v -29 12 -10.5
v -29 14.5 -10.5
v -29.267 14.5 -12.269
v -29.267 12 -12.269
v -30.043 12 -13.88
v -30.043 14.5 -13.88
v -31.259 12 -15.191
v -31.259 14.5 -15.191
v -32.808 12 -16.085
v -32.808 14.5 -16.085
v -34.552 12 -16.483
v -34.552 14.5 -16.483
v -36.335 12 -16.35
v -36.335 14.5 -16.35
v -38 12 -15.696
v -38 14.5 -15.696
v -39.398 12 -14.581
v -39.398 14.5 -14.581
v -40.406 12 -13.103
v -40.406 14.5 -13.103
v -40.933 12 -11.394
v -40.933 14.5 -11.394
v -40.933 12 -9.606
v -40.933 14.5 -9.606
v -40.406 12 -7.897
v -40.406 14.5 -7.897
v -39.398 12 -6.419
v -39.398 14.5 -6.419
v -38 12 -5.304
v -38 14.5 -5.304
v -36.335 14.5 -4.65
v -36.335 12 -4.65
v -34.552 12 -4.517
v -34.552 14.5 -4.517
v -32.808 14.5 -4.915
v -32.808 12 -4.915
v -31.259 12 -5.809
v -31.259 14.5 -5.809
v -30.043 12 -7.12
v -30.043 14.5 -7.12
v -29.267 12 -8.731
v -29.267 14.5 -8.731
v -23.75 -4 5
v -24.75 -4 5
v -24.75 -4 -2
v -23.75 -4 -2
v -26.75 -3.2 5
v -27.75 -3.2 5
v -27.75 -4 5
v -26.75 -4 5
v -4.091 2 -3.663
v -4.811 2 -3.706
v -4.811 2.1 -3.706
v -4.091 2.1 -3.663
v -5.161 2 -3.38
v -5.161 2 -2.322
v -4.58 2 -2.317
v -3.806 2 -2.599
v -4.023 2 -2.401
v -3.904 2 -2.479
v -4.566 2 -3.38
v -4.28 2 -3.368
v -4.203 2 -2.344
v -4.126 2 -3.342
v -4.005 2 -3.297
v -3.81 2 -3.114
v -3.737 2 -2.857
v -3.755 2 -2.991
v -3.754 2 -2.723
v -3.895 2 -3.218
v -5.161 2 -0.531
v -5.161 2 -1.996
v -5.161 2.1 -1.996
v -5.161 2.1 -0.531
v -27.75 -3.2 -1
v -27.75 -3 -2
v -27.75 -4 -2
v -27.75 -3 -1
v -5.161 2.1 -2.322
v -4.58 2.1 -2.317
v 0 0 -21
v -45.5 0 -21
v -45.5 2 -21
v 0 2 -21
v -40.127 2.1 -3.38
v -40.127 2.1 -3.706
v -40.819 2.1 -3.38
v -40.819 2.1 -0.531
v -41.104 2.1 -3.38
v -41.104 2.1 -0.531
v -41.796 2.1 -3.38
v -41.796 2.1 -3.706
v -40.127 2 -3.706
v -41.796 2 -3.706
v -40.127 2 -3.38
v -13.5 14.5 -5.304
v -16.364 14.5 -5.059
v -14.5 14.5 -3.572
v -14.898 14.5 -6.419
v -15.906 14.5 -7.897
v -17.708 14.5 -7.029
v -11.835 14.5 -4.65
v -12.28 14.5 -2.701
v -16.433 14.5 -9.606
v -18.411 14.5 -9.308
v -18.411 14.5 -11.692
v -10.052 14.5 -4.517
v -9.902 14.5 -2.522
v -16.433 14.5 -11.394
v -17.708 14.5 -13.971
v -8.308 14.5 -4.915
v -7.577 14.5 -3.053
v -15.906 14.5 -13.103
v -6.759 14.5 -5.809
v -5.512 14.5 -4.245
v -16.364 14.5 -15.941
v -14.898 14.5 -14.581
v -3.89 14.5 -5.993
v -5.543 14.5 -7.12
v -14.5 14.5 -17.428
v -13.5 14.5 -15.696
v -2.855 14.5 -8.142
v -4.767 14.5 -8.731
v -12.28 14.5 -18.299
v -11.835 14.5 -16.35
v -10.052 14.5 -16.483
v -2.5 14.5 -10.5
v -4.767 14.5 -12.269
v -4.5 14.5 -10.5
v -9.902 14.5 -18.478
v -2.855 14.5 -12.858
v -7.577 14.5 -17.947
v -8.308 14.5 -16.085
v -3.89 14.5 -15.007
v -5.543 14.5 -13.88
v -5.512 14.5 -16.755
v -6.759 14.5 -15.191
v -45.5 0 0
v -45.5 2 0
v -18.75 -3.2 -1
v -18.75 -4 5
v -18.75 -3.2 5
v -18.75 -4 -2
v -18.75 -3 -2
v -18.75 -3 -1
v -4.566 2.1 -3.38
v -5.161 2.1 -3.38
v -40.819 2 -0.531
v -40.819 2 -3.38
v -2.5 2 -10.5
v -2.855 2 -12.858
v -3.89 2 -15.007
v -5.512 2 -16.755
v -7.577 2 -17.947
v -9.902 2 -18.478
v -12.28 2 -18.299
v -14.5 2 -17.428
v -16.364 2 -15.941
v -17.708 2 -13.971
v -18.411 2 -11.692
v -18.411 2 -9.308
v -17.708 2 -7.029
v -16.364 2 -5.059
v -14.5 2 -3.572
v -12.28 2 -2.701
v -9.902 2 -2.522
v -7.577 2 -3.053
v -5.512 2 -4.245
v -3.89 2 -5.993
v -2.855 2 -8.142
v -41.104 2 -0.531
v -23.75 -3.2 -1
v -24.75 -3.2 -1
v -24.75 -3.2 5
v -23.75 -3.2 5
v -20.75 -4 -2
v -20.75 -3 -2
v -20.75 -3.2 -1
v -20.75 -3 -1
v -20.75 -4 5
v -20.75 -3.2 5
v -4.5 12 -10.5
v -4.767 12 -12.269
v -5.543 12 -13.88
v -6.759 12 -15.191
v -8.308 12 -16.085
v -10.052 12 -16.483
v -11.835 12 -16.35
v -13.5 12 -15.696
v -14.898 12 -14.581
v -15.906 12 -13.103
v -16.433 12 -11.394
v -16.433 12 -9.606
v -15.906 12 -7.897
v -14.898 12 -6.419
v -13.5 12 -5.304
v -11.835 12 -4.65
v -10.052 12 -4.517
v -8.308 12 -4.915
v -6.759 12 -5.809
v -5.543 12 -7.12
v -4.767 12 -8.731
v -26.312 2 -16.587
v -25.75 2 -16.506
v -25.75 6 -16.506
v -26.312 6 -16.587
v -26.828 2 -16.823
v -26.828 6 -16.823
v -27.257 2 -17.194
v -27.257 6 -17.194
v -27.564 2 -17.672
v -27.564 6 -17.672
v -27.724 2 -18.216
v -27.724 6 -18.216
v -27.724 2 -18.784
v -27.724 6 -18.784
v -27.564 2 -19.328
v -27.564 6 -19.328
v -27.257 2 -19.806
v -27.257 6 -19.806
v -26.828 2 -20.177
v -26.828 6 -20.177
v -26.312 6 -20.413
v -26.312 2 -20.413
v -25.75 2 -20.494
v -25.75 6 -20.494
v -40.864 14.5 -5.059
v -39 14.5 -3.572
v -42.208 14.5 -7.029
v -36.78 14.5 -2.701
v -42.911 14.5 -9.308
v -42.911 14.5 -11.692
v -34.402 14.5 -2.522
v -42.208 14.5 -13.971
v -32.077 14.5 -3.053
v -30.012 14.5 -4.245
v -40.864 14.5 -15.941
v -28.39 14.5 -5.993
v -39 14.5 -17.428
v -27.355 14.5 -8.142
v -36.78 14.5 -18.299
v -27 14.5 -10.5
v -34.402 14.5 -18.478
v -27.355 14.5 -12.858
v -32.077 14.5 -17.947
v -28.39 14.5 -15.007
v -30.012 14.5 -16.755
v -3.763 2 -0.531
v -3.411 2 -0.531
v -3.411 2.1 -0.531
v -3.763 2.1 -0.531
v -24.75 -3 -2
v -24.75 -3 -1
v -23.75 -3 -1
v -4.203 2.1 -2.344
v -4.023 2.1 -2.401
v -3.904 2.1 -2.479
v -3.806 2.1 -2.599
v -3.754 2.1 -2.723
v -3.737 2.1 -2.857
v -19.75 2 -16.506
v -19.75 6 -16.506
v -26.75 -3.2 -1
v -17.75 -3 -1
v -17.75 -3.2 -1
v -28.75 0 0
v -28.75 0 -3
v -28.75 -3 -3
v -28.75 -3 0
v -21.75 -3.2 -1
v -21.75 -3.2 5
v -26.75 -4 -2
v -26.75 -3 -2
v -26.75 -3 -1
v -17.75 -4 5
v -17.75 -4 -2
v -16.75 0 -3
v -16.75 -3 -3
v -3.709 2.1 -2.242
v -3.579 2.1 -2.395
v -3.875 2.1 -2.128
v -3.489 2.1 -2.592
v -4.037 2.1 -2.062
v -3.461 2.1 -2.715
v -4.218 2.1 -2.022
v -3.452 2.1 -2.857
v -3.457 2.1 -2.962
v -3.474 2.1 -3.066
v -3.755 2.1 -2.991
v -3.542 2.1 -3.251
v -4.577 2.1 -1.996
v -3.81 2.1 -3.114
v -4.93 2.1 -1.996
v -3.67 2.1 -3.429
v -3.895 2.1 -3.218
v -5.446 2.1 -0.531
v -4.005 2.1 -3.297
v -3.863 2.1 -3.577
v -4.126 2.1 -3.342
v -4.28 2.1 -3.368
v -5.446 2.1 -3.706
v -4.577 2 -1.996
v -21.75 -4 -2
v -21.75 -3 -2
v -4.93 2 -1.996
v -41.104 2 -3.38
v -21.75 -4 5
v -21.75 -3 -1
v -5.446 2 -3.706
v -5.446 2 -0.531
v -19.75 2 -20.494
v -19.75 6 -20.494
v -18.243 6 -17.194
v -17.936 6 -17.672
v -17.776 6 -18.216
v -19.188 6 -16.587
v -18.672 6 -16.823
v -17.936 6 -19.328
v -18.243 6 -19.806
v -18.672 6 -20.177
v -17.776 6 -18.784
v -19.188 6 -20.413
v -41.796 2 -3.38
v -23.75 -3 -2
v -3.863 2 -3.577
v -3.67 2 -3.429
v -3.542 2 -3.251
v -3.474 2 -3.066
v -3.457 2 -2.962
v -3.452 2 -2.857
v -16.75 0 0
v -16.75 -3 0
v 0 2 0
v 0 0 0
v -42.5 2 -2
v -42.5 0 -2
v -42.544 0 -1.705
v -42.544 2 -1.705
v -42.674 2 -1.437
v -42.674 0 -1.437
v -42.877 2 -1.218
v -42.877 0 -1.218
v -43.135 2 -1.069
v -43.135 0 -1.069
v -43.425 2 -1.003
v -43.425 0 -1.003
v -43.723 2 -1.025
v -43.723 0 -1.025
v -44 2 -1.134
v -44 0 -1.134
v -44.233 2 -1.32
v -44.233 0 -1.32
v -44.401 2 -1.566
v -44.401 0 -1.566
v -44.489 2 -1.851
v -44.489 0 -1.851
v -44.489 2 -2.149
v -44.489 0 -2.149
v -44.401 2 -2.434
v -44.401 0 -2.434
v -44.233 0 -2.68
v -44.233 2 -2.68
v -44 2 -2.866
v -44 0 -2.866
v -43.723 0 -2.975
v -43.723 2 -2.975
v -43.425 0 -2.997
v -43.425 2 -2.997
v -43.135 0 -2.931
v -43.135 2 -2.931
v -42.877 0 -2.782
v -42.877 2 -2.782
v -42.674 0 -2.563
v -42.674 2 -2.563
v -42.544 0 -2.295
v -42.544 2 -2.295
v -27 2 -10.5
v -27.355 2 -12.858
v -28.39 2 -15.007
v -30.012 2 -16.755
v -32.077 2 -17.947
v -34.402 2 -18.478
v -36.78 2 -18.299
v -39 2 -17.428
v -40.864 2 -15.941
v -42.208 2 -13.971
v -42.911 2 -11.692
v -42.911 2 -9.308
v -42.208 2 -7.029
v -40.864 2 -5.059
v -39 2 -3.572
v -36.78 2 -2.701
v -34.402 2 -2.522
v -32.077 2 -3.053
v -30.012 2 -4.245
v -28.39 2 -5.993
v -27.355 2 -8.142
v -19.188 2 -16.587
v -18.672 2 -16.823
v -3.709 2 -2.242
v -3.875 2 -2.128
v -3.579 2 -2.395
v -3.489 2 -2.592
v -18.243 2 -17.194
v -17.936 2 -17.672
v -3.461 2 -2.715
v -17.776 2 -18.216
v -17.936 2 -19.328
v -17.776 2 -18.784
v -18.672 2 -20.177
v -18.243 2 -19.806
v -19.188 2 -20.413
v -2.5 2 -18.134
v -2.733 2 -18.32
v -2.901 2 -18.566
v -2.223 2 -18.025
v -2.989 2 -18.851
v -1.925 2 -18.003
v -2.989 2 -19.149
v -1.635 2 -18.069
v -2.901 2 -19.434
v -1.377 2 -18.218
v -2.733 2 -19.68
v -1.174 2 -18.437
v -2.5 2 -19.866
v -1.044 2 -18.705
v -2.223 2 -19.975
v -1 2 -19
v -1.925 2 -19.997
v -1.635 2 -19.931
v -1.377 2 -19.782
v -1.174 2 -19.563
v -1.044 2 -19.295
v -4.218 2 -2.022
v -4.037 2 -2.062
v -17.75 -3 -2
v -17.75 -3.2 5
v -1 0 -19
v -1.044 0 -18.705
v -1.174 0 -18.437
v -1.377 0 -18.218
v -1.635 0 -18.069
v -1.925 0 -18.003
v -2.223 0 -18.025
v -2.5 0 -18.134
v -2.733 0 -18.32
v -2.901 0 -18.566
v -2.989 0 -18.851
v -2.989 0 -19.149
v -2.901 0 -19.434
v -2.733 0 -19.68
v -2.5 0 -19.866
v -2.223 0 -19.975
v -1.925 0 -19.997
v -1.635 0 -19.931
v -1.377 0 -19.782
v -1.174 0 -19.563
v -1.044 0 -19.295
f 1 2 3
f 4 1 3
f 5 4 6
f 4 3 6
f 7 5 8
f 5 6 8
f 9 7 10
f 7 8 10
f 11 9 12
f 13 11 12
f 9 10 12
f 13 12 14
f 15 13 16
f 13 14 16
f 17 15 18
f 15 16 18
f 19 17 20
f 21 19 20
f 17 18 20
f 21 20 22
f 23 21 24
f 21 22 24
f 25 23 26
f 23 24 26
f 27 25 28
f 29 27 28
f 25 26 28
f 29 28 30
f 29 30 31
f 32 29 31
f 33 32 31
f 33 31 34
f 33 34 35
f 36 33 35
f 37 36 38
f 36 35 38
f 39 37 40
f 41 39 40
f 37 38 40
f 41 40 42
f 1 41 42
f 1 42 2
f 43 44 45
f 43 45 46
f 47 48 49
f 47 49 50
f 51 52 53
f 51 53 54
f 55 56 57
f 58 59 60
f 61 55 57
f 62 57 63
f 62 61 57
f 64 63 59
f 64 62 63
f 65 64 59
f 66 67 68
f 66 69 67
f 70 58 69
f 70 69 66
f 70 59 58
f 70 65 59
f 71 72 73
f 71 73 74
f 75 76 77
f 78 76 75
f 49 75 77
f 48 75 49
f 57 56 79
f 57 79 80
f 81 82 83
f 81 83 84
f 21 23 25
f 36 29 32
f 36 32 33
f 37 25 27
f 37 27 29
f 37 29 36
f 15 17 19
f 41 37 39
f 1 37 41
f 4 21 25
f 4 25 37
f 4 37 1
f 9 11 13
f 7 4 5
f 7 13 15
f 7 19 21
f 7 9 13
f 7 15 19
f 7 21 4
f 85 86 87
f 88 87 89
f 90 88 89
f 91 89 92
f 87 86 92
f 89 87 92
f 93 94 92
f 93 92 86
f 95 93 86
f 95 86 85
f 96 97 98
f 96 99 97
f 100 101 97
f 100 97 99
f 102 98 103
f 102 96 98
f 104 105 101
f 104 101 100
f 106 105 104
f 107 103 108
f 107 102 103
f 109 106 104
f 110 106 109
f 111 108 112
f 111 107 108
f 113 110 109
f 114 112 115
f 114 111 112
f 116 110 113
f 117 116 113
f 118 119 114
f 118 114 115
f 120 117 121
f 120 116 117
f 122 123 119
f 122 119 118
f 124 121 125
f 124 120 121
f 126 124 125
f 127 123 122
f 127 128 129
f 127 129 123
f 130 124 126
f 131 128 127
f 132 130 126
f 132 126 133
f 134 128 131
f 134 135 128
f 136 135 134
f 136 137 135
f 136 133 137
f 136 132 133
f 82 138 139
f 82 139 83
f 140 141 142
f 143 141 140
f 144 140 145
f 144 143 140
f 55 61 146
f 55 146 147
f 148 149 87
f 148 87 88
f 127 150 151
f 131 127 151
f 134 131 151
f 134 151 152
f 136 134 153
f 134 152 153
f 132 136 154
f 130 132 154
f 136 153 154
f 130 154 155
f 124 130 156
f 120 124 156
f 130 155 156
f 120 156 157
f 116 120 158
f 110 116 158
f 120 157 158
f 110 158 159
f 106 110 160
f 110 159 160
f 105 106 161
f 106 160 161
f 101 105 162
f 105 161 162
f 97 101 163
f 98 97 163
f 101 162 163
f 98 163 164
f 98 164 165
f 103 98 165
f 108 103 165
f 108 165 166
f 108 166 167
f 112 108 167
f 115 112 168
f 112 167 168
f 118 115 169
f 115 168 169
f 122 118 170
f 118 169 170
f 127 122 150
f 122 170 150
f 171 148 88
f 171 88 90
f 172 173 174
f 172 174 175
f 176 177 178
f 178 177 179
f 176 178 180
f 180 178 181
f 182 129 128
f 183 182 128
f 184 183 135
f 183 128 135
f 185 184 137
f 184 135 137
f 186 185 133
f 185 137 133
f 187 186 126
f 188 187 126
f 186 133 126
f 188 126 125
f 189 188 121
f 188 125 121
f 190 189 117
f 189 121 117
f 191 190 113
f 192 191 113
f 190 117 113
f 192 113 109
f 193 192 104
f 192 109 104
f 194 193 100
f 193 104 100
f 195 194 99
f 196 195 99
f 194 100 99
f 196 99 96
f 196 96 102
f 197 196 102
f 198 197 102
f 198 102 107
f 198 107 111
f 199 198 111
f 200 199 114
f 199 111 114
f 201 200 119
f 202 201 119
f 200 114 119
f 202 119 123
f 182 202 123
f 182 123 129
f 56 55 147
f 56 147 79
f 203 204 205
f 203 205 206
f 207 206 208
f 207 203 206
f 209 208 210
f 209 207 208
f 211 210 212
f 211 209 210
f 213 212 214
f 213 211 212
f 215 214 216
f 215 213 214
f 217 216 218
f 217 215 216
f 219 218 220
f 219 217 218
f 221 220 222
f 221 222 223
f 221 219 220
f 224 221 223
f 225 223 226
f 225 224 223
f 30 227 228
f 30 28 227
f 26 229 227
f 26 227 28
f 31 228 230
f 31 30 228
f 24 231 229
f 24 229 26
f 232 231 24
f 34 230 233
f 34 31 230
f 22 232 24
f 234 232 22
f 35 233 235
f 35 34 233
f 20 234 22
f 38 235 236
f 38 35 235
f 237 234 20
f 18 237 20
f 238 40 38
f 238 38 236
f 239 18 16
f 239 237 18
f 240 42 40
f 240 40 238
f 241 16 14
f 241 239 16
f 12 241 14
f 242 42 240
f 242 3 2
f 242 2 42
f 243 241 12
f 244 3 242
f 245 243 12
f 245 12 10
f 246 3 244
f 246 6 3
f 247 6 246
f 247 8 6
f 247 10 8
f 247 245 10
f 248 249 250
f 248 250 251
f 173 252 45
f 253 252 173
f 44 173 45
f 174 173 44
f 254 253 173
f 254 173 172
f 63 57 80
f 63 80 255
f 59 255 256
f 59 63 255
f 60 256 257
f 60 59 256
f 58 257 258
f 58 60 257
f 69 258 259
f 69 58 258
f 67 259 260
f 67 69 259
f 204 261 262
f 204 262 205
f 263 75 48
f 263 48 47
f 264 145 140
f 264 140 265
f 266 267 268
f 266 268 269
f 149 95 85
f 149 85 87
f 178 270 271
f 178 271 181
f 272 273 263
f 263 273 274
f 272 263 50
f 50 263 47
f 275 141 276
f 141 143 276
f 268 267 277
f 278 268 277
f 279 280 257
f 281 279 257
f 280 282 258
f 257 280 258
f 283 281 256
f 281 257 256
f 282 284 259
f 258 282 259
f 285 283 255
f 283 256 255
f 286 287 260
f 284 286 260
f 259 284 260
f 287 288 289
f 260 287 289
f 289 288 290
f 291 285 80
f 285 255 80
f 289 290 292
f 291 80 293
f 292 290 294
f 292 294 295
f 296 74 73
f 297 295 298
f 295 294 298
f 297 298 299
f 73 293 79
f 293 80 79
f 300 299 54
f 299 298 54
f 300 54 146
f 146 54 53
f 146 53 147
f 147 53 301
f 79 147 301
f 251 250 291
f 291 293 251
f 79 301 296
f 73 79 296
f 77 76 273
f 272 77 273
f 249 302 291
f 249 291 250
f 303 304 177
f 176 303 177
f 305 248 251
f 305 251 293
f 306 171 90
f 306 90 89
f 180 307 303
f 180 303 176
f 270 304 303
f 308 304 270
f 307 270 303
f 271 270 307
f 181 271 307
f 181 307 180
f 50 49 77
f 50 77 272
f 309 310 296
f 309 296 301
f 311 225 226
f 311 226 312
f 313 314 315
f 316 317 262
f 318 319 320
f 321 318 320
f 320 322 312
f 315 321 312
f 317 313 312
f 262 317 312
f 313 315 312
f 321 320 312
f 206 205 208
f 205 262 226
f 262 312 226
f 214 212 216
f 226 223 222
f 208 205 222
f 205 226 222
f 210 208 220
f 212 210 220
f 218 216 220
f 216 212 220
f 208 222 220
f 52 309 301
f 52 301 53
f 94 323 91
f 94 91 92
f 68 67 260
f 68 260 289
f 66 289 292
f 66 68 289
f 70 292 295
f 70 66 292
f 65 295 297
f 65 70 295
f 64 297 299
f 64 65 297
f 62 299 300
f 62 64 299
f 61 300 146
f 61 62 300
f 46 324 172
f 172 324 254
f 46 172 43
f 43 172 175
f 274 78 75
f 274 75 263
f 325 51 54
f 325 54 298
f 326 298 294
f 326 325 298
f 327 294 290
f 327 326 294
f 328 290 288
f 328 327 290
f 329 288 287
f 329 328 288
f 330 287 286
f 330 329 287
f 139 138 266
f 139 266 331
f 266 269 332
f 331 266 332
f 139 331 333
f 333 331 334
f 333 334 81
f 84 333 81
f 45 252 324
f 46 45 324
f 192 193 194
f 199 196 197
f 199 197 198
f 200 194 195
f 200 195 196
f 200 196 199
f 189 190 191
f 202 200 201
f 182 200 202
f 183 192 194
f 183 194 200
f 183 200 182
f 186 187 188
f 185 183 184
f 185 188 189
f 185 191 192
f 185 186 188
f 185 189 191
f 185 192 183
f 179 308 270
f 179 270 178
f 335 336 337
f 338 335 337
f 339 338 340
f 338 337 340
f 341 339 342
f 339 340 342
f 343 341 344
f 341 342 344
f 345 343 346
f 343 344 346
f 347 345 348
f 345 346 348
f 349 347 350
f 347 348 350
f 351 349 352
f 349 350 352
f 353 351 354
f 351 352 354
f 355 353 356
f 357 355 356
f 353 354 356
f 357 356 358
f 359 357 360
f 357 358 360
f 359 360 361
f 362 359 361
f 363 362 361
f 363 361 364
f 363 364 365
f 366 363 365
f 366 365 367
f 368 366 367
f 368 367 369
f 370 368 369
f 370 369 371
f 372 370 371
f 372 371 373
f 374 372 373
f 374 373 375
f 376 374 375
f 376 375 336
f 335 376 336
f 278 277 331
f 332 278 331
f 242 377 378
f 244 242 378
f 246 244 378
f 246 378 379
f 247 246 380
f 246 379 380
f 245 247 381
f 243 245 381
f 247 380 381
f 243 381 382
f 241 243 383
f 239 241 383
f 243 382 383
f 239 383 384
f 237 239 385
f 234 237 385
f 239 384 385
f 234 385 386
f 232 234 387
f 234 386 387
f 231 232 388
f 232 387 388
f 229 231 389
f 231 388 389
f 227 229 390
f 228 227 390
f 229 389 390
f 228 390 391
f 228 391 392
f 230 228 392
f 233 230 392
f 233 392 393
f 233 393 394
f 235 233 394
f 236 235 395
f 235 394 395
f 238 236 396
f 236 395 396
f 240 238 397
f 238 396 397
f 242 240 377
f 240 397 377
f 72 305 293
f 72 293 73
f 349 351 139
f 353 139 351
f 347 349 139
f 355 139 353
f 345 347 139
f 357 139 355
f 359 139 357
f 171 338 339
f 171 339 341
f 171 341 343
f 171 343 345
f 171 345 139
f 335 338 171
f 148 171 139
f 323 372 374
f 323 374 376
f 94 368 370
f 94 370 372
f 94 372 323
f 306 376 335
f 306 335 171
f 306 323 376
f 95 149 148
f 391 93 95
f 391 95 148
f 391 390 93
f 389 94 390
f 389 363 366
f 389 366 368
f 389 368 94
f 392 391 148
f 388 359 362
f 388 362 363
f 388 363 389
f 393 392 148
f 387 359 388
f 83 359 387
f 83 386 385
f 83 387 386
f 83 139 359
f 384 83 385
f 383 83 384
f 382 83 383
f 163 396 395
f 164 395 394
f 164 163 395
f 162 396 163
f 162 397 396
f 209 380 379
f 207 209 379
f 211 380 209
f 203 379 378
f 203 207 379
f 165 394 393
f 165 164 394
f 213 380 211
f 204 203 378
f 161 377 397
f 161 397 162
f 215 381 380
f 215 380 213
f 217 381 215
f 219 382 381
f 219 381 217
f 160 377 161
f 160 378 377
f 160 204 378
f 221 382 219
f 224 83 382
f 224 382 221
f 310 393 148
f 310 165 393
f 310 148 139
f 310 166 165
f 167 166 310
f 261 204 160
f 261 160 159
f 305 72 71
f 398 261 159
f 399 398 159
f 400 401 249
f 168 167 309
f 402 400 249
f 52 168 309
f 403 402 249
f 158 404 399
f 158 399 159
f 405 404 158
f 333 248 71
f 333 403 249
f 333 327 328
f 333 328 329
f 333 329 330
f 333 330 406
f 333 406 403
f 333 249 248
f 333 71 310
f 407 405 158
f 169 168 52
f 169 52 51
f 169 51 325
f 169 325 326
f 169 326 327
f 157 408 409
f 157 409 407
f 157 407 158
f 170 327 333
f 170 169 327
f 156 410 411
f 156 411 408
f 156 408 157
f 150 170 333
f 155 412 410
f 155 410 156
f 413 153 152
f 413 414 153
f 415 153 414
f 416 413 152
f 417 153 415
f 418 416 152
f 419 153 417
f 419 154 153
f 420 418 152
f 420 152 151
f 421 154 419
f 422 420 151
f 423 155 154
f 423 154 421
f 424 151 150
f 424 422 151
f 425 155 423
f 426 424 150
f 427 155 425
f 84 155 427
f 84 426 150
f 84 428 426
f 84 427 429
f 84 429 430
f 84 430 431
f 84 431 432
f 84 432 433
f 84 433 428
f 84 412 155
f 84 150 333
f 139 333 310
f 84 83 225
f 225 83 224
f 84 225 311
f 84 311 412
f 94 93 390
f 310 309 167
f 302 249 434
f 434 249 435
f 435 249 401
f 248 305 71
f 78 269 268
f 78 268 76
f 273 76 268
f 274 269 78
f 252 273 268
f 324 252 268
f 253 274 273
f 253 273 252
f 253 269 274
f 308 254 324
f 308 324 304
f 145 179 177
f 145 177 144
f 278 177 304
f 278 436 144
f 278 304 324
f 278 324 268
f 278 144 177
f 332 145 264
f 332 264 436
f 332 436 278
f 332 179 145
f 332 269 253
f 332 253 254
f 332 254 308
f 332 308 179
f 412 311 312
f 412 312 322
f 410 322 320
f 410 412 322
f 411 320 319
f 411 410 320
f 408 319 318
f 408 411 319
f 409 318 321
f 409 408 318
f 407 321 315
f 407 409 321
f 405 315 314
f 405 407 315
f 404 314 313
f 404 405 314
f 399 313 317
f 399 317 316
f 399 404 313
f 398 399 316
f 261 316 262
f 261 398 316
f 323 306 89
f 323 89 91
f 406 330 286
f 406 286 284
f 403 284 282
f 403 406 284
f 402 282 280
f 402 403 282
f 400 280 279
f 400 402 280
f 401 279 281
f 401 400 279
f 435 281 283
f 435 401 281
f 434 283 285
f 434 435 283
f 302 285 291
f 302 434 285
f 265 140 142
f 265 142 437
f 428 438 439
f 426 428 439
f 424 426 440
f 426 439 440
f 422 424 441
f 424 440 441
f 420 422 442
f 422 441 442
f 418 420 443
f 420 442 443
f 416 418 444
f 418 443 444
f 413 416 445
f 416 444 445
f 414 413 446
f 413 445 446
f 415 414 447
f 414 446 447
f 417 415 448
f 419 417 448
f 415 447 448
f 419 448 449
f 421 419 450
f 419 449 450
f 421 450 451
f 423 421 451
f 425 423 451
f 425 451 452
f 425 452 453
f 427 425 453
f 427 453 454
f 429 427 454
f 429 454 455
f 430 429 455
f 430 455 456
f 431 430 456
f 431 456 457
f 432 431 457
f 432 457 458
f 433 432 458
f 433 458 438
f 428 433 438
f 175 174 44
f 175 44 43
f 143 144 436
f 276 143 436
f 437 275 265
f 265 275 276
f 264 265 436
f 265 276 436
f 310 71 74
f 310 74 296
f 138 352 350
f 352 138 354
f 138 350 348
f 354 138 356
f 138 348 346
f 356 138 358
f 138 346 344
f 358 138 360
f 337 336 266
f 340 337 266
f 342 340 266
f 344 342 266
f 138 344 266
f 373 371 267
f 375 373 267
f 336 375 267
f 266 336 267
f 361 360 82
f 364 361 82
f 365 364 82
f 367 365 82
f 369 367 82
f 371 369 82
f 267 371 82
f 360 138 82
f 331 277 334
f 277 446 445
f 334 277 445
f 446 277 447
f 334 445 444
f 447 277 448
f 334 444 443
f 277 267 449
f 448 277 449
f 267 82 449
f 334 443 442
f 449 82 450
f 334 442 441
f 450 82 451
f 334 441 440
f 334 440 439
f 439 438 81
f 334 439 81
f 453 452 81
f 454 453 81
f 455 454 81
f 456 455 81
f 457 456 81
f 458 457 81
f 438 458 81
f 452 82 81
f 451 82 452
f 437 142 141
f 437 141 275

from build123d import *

# Parameters (mm, degrees)
SKETCH2_W            = 45.5
SKETCH2_H            = 21
BOSS_EXTRUDE2_DEPTH  = 2
SKETCH4_R            = 8
BOSS_EXTRUDE3_DEPTH  = 12.5
SKETCH5_R            = 6
CUT_EXTRUDE1_DEPTH   = 2.5
BOSS_EXTRUDE5_DEPTH  = 4
SKETCH7_W            = 6
SKETCH7_H            = 3
BOSS_EXTRUDE6_DEPTH  = 3
SKETCH8_W            = 1
SKETCH8_H            = 1
BOSS_EXTRUDE7_DEPTH  = 1
SKETCH10_W           = 1
SKETCH10_H           = 0.8
BOSS_EXTRUDE8_DEPTH  = 6
SKETCH11_R           = 1
CUT_EXTRUDE2_DEPTH   = 15.5
BOSS_EXTRUDE10_DEPTH = 0.1


with BuildPart() as part:
    # Sketch2 → Boss-Extrude2 (new body)
    with BuildSketch(Plane(origin=(0, 0, 0), x_dir=(1, 0, 0), z_dir=(0, 1, 0))):
        with Locations((-22.75, 10.5)):
            Rectangle(SKETCH2_W, SKETCH2_H)
    extrude(amount=BOSS_EXTRUDE2_DEPTH)

    # Sketch4 → Boss-Extrude3 (add)
    with BuildSketch(Plane(origin=(0, 2, 0), x_dir=(1, 0, 0), z_dir=(0, 1, 0))):
        with Locations((-35, 10.5)):
            Circle(SKETCH4_R)
        with Locations((-10.5, 10.5)):
            Circle(SKETCH4_R)
    extrude(amount=BOSS_EXTRUDE3_DEPTH)

    # Sketch5 → Cut-Extrude1 (cut)
    with BuildSketch(Plane(origin=(0, 14.5, 0), x_dir=(1, 0, 0), z_dir=(0, 1, 0))):
        with Locations((-35, 10.5)):
            Circle(SKETCH5_R)
        with Locations((-10.5, 10.5)):
            Circle(SKETCH5_R)
    extrude(amount=-CUT_EXTRUDE1_DEPTH, mode=Mode.SUBTRACT)

    # Sketch6 → Boss-Extrude5 (add)
    with BuildSketch(Plane(origin=(0, 2, 0), x_dir=(1, 0, 0), z_dir=(0, 1, 0))):
        with BuildLine():
            Line((-25.75, 20.493953902), (-19.75, 20.493953902))
            ThreePointArc((-19.75, 20.493953902), (-17.756046098, 18.5), (-19.75, 16.506046098))
            Line((-19.75, 16.506046098), (-25.75, 16.506046098))
            ThreePointArc((-25.75, 16.506046098), (-27.743953902, 18.5), (-25.75, 20.493953902))
        make_face()
    extrude(amount=BOSS_EXTRUDE5_DEPTH)

    # Sketch7 → Boss-Extrude6 (add)
    with BuildSketch(Plane.XZ):
        with Locations((-19.75, -1.5)):
            Rectangle(SKETCH7_W, SKETCH7_H)
        with Locations((-25.75, -1.5)):
            Rectangle(SKETCH7_W, SKETCH7_H)
    extrude(amount=BOSS_EXTRUDE6_DEPTH)

    # Sketch8 → Boss-Extrude7 (add)
    with BuildSketch(Plane.XZ.offset(3)):
        with Locations((-24.25, -1.5)):
            Rectangle(SKETCH8_W, SKETCH8_H)
        with Locations((-21.25, -1.5)):
            Rectangle(SKETCH8_W, SKETCH8_H)
        with Locations((-18.25, -1.5)):
            Rectangle(SKETCH8_W, SKETCH8_H)
        with Locations((-27.25, -1.5)):
            Rectangle(SKETCH8_W, SKETCH8_H)
    extrude(amount=BOSS_EXTRUDE7_DEPTH)

    # Sketch10 → Boss-Extrude8 (add)
    with BuildSketch(Plane.XY.offset(-1)):
        with Locations((-18.25, -3.6)):
            Rectangle(SKETCH10_W, SKETCH10_H)
        with Locations((-21.25, -3.6)):
            Rectangle(SKETCH10_W, SKETCH10_H)
        with Locations((-24.25, -3.6)):
            Rectangle(SKETCH10_W, SKETCH10_H)
        with Locations((-27.25, -3.6)):
            Rectangle(SKETCH10_W, SKETCH10_H)
    extrude(amount=BOSS_EXTRUDE8_DEPTH)

    # Sketch11 → Cut-Extrude2 (cut, through all)
    with BuildSketch(Plane.XZ):
        with Locations((-2, -19)):
            Circle(SKETCH11_R)
        with Locations((-43.5, -2)):
            Circle(SKETCH11_R)
    extrude(amount=-CUT_EXTRUDE2_DEPTH, mode=Mode.SUBTRACT)

    # Sketch15 → Boss-Extrude10 (add)
    with BuildSketch(Plane(origin=(0, 2, 0), x_dir=(1, 0, 0), z_dir=(0, 1, 0))):
        Polygon((-41.795833333, 3.38023745), (-41.795833333, 3.705878476), (-40.126923077, 3.705878476), (-40.126923077, 3.38023745), (-40.818910256, 3.38023745), (-40.818910256, 0.530878476), (-41.103846154, 0.530878476), (-41.103846154, 3.38023745), align=None)
        with BuildLine():
            Line((-5.446153846, 3.705878476), (-4.810772236, 3.705878476))
            add(Edge.make_bspline(
                [(-4.810772236, 3.705878476), (-4.768371355, 3.705737337), (-4.686956967, 3.705466335), (-4.570322643, 3.70395525), (-4.464343776, 3.699624228), (-4.369075779, 3.695897155), (-4.284520399, 3.689100894), (-4.210418357, 3.682605164), (-4.147110946, 3.674101915), (-4.108787923, 3.666204853), (-4.091436298, 3.662629277)],
                knots=[0, 0, 0, 0, 0.000127205, 0.000244248, 0.000349896, 0.000445402, 0.000530231, 0.00060434, 0.000668562, 0.000721699, 0.000721699, 0.000721699, 0.000721699], degree=3))
            add(Edge.make_bspline(
                [(-4.091436298, 3.662629277), (-4.068207432, 3.656889997), (-4.022245234, 3.645533872), (-3.956069103, 3.621531234), (-3.893009681, 3.59375486), (-3.833328911, 3.561130628), (-3.777325729, 3.523416363), (-3.72442269, 3.481263138), (-3.674379734, 3.434901601), (-3.629220684, 3.383162852), (-3.586640258, 3.32888259), (-3.550727719, 3.270187039), (-3.519770126, 3.208808368), (-3.495122586, 3.144122353), (-3.475276139, 3.076756317), (-3.461282336, 3.006100052), (-3.452890187, 2.932475453), (-3.452035789, 2.882257921), (-3.451602564, 2.856794942)],
                knots=[0, 0, 0, 0, 7.1738e-05, 0.000141945, 0.000210849, 0.000278309, 0.000345694, 0.000413139, 0.000481086, 0.000550014, 0.000618962, 0.000687796, 0.000756061, 0.000824921, 0.000895163, 0.000966511, 0.001040751, 0.001117115, 0.001117115, 0.001117115, 0.001117115], degree=3))
            add(Edge.make_bspline(
                [(-3.451602564, 2.856794942), (-3.452935155, 2.81449024), (-3.455535386, 2.731942809), (-3.479778873, 2.612144724), (-3.51949043, 2.500394417), (-3.574212271, 2.396832596), (-3.643898509, 2.303477939), (-3.727650284, 2.221480883), (-3.825514317, 2.152864676), (-3.916618054, 2.105282489), (-3.997094506, 2.074808922), (-4.063346155, 2.053367368), (-4.135615484, 2.036801157), (-4.213210066, 2.02196018), (-4.296452811, 2.010755429), (-4.385144204, 2.002548875), (-4.479347498, 1.997419845), (-4.544062226, 1.996656027), (-4.577353766, 1.996263091)],
                knots=[0, 0, 0, 0, 0.000126797, 0.000247415, 0.000364897, 0.000481551, 0.000597433, 0.000713022, 0.000831615, 0.000954788, 0.001020224, 0.001089619, 0.001163513, 0.001242474, 0.001326575, 0.001415367, 0.001509635, 0.001609508, 0.001609508, 0.001609508, 0.001609508], degree=3))
            Line((-4.577353766, 1.996263091), (-3.410897436, 0.530878476))
            Line((-3.410897436, 0.530878476), (-3.763251202, 0.530878476))
            Line((-3.763251202, 0.530878476), (-4.929707532, 1.996263091))
            Line((-4.929707532, 1.996263091), (-5.161217949, 1.996263091))
            Line((-5.161217949, 1.996263091), (-5.161217949, 0.530878476))
            Line((-5.161217949, 0.530878476), (-5.446153846, 0.530878476))
            Line((-5.446153846, 0.530878476), (-5.446153846, 3.705878476))
        make_face()
        with BuildLine():
            Line((-5.161217949, 3.38023745), (-5.161217949, 2.321904117))
            Line((-5.161217949, 2.321904117), (-4.579897837, 2.317451994))
            add(Edge.make_bspline(
                [(-4.579897837, 2.317451994), (-4.552756087, 2.317439986), (-4.500147646, 2.317416712), (-4.424037757, 2.321039638), (-4.353171656, 2.325161076), (-4.287820402, 2.331465125), (-4.227954802, 2.339589562), (-4.173604777, 2.349752269), (-4.124681608, 2.361592354), (-4.067623648, 2.379918115), (-4.003909081, 2.408952146), (-3.934665542, 2.451193705), (-3.875699136, 2.504324263), (-3.825880789, 2.565078756), (-3.785849091, 2.631877353), (-3.757626013, 2.703919345), (-3.739716797, 2.779386009), (-3.737604474, 2.831254721), (-3.736538462, 2.85743096)],
                knots=[0, 0, 0, 0, 8.1413e-05, 0.000157801, 0.000228539, 0.000294357, 0.000354712, 0.000409723, 0.000460165, 0.000505621, 0.000589315, 0.00066961, 0.000747992, 0.000826171, 0.000904597, 0.000980539, 0.001057529, 0.001135968, 0.001135968, 0.001135968, 0.001135968], degree=3))
            add(Edge.make_bspline(
                [(-3.736538462, 2.85743096), (-3.737628957, 2.882963923), (-3.739789921, 2.93356094), (-3.757432733, 3.007634515), (-3.7872681, 3.077545249), (-3.827474702, 3.143008746), (-3.876459649, 3.202431806), (-3.933897951, 3.253274581), (-3.998219092, 3.295229452), (-4.058336537, 3.322039498), (-4.112070429, 3.338476793), (-4.158724478, 3.35004392), (-4.21143989, 3.359337117), (-4.270472627, 3.366783001), (-4.335570678, 3.373182843), (-4.407063197, 3.377493385), (-4.484475848, 3.380045962), (-4.538130564, 3.380172135), (-4.565905449, 3.38023745)],
                knots=[0, 0, 0, 0, 7.6536e-05, 0.000151667, 0.000226914, 0.000303706, 0.000381394, 0.000457083, 0.00053294, 0.00061095, 0.000653596, 0.000701416, 0.000755061, 0.00081407, 0.000879888, 0.000951261, 0.001028897, 0.001112218, 0.001112218, 0.001112218, 0.001112218], degree=3))
            Line((-4.565905449, 3.38023745), (-5.161217949, 3.38023745))
        make_face(mode=Mode.SUBTRACT)
    extrude(amount=BOSS_EXTRUDE10_DEPTH)


solid = part.part
